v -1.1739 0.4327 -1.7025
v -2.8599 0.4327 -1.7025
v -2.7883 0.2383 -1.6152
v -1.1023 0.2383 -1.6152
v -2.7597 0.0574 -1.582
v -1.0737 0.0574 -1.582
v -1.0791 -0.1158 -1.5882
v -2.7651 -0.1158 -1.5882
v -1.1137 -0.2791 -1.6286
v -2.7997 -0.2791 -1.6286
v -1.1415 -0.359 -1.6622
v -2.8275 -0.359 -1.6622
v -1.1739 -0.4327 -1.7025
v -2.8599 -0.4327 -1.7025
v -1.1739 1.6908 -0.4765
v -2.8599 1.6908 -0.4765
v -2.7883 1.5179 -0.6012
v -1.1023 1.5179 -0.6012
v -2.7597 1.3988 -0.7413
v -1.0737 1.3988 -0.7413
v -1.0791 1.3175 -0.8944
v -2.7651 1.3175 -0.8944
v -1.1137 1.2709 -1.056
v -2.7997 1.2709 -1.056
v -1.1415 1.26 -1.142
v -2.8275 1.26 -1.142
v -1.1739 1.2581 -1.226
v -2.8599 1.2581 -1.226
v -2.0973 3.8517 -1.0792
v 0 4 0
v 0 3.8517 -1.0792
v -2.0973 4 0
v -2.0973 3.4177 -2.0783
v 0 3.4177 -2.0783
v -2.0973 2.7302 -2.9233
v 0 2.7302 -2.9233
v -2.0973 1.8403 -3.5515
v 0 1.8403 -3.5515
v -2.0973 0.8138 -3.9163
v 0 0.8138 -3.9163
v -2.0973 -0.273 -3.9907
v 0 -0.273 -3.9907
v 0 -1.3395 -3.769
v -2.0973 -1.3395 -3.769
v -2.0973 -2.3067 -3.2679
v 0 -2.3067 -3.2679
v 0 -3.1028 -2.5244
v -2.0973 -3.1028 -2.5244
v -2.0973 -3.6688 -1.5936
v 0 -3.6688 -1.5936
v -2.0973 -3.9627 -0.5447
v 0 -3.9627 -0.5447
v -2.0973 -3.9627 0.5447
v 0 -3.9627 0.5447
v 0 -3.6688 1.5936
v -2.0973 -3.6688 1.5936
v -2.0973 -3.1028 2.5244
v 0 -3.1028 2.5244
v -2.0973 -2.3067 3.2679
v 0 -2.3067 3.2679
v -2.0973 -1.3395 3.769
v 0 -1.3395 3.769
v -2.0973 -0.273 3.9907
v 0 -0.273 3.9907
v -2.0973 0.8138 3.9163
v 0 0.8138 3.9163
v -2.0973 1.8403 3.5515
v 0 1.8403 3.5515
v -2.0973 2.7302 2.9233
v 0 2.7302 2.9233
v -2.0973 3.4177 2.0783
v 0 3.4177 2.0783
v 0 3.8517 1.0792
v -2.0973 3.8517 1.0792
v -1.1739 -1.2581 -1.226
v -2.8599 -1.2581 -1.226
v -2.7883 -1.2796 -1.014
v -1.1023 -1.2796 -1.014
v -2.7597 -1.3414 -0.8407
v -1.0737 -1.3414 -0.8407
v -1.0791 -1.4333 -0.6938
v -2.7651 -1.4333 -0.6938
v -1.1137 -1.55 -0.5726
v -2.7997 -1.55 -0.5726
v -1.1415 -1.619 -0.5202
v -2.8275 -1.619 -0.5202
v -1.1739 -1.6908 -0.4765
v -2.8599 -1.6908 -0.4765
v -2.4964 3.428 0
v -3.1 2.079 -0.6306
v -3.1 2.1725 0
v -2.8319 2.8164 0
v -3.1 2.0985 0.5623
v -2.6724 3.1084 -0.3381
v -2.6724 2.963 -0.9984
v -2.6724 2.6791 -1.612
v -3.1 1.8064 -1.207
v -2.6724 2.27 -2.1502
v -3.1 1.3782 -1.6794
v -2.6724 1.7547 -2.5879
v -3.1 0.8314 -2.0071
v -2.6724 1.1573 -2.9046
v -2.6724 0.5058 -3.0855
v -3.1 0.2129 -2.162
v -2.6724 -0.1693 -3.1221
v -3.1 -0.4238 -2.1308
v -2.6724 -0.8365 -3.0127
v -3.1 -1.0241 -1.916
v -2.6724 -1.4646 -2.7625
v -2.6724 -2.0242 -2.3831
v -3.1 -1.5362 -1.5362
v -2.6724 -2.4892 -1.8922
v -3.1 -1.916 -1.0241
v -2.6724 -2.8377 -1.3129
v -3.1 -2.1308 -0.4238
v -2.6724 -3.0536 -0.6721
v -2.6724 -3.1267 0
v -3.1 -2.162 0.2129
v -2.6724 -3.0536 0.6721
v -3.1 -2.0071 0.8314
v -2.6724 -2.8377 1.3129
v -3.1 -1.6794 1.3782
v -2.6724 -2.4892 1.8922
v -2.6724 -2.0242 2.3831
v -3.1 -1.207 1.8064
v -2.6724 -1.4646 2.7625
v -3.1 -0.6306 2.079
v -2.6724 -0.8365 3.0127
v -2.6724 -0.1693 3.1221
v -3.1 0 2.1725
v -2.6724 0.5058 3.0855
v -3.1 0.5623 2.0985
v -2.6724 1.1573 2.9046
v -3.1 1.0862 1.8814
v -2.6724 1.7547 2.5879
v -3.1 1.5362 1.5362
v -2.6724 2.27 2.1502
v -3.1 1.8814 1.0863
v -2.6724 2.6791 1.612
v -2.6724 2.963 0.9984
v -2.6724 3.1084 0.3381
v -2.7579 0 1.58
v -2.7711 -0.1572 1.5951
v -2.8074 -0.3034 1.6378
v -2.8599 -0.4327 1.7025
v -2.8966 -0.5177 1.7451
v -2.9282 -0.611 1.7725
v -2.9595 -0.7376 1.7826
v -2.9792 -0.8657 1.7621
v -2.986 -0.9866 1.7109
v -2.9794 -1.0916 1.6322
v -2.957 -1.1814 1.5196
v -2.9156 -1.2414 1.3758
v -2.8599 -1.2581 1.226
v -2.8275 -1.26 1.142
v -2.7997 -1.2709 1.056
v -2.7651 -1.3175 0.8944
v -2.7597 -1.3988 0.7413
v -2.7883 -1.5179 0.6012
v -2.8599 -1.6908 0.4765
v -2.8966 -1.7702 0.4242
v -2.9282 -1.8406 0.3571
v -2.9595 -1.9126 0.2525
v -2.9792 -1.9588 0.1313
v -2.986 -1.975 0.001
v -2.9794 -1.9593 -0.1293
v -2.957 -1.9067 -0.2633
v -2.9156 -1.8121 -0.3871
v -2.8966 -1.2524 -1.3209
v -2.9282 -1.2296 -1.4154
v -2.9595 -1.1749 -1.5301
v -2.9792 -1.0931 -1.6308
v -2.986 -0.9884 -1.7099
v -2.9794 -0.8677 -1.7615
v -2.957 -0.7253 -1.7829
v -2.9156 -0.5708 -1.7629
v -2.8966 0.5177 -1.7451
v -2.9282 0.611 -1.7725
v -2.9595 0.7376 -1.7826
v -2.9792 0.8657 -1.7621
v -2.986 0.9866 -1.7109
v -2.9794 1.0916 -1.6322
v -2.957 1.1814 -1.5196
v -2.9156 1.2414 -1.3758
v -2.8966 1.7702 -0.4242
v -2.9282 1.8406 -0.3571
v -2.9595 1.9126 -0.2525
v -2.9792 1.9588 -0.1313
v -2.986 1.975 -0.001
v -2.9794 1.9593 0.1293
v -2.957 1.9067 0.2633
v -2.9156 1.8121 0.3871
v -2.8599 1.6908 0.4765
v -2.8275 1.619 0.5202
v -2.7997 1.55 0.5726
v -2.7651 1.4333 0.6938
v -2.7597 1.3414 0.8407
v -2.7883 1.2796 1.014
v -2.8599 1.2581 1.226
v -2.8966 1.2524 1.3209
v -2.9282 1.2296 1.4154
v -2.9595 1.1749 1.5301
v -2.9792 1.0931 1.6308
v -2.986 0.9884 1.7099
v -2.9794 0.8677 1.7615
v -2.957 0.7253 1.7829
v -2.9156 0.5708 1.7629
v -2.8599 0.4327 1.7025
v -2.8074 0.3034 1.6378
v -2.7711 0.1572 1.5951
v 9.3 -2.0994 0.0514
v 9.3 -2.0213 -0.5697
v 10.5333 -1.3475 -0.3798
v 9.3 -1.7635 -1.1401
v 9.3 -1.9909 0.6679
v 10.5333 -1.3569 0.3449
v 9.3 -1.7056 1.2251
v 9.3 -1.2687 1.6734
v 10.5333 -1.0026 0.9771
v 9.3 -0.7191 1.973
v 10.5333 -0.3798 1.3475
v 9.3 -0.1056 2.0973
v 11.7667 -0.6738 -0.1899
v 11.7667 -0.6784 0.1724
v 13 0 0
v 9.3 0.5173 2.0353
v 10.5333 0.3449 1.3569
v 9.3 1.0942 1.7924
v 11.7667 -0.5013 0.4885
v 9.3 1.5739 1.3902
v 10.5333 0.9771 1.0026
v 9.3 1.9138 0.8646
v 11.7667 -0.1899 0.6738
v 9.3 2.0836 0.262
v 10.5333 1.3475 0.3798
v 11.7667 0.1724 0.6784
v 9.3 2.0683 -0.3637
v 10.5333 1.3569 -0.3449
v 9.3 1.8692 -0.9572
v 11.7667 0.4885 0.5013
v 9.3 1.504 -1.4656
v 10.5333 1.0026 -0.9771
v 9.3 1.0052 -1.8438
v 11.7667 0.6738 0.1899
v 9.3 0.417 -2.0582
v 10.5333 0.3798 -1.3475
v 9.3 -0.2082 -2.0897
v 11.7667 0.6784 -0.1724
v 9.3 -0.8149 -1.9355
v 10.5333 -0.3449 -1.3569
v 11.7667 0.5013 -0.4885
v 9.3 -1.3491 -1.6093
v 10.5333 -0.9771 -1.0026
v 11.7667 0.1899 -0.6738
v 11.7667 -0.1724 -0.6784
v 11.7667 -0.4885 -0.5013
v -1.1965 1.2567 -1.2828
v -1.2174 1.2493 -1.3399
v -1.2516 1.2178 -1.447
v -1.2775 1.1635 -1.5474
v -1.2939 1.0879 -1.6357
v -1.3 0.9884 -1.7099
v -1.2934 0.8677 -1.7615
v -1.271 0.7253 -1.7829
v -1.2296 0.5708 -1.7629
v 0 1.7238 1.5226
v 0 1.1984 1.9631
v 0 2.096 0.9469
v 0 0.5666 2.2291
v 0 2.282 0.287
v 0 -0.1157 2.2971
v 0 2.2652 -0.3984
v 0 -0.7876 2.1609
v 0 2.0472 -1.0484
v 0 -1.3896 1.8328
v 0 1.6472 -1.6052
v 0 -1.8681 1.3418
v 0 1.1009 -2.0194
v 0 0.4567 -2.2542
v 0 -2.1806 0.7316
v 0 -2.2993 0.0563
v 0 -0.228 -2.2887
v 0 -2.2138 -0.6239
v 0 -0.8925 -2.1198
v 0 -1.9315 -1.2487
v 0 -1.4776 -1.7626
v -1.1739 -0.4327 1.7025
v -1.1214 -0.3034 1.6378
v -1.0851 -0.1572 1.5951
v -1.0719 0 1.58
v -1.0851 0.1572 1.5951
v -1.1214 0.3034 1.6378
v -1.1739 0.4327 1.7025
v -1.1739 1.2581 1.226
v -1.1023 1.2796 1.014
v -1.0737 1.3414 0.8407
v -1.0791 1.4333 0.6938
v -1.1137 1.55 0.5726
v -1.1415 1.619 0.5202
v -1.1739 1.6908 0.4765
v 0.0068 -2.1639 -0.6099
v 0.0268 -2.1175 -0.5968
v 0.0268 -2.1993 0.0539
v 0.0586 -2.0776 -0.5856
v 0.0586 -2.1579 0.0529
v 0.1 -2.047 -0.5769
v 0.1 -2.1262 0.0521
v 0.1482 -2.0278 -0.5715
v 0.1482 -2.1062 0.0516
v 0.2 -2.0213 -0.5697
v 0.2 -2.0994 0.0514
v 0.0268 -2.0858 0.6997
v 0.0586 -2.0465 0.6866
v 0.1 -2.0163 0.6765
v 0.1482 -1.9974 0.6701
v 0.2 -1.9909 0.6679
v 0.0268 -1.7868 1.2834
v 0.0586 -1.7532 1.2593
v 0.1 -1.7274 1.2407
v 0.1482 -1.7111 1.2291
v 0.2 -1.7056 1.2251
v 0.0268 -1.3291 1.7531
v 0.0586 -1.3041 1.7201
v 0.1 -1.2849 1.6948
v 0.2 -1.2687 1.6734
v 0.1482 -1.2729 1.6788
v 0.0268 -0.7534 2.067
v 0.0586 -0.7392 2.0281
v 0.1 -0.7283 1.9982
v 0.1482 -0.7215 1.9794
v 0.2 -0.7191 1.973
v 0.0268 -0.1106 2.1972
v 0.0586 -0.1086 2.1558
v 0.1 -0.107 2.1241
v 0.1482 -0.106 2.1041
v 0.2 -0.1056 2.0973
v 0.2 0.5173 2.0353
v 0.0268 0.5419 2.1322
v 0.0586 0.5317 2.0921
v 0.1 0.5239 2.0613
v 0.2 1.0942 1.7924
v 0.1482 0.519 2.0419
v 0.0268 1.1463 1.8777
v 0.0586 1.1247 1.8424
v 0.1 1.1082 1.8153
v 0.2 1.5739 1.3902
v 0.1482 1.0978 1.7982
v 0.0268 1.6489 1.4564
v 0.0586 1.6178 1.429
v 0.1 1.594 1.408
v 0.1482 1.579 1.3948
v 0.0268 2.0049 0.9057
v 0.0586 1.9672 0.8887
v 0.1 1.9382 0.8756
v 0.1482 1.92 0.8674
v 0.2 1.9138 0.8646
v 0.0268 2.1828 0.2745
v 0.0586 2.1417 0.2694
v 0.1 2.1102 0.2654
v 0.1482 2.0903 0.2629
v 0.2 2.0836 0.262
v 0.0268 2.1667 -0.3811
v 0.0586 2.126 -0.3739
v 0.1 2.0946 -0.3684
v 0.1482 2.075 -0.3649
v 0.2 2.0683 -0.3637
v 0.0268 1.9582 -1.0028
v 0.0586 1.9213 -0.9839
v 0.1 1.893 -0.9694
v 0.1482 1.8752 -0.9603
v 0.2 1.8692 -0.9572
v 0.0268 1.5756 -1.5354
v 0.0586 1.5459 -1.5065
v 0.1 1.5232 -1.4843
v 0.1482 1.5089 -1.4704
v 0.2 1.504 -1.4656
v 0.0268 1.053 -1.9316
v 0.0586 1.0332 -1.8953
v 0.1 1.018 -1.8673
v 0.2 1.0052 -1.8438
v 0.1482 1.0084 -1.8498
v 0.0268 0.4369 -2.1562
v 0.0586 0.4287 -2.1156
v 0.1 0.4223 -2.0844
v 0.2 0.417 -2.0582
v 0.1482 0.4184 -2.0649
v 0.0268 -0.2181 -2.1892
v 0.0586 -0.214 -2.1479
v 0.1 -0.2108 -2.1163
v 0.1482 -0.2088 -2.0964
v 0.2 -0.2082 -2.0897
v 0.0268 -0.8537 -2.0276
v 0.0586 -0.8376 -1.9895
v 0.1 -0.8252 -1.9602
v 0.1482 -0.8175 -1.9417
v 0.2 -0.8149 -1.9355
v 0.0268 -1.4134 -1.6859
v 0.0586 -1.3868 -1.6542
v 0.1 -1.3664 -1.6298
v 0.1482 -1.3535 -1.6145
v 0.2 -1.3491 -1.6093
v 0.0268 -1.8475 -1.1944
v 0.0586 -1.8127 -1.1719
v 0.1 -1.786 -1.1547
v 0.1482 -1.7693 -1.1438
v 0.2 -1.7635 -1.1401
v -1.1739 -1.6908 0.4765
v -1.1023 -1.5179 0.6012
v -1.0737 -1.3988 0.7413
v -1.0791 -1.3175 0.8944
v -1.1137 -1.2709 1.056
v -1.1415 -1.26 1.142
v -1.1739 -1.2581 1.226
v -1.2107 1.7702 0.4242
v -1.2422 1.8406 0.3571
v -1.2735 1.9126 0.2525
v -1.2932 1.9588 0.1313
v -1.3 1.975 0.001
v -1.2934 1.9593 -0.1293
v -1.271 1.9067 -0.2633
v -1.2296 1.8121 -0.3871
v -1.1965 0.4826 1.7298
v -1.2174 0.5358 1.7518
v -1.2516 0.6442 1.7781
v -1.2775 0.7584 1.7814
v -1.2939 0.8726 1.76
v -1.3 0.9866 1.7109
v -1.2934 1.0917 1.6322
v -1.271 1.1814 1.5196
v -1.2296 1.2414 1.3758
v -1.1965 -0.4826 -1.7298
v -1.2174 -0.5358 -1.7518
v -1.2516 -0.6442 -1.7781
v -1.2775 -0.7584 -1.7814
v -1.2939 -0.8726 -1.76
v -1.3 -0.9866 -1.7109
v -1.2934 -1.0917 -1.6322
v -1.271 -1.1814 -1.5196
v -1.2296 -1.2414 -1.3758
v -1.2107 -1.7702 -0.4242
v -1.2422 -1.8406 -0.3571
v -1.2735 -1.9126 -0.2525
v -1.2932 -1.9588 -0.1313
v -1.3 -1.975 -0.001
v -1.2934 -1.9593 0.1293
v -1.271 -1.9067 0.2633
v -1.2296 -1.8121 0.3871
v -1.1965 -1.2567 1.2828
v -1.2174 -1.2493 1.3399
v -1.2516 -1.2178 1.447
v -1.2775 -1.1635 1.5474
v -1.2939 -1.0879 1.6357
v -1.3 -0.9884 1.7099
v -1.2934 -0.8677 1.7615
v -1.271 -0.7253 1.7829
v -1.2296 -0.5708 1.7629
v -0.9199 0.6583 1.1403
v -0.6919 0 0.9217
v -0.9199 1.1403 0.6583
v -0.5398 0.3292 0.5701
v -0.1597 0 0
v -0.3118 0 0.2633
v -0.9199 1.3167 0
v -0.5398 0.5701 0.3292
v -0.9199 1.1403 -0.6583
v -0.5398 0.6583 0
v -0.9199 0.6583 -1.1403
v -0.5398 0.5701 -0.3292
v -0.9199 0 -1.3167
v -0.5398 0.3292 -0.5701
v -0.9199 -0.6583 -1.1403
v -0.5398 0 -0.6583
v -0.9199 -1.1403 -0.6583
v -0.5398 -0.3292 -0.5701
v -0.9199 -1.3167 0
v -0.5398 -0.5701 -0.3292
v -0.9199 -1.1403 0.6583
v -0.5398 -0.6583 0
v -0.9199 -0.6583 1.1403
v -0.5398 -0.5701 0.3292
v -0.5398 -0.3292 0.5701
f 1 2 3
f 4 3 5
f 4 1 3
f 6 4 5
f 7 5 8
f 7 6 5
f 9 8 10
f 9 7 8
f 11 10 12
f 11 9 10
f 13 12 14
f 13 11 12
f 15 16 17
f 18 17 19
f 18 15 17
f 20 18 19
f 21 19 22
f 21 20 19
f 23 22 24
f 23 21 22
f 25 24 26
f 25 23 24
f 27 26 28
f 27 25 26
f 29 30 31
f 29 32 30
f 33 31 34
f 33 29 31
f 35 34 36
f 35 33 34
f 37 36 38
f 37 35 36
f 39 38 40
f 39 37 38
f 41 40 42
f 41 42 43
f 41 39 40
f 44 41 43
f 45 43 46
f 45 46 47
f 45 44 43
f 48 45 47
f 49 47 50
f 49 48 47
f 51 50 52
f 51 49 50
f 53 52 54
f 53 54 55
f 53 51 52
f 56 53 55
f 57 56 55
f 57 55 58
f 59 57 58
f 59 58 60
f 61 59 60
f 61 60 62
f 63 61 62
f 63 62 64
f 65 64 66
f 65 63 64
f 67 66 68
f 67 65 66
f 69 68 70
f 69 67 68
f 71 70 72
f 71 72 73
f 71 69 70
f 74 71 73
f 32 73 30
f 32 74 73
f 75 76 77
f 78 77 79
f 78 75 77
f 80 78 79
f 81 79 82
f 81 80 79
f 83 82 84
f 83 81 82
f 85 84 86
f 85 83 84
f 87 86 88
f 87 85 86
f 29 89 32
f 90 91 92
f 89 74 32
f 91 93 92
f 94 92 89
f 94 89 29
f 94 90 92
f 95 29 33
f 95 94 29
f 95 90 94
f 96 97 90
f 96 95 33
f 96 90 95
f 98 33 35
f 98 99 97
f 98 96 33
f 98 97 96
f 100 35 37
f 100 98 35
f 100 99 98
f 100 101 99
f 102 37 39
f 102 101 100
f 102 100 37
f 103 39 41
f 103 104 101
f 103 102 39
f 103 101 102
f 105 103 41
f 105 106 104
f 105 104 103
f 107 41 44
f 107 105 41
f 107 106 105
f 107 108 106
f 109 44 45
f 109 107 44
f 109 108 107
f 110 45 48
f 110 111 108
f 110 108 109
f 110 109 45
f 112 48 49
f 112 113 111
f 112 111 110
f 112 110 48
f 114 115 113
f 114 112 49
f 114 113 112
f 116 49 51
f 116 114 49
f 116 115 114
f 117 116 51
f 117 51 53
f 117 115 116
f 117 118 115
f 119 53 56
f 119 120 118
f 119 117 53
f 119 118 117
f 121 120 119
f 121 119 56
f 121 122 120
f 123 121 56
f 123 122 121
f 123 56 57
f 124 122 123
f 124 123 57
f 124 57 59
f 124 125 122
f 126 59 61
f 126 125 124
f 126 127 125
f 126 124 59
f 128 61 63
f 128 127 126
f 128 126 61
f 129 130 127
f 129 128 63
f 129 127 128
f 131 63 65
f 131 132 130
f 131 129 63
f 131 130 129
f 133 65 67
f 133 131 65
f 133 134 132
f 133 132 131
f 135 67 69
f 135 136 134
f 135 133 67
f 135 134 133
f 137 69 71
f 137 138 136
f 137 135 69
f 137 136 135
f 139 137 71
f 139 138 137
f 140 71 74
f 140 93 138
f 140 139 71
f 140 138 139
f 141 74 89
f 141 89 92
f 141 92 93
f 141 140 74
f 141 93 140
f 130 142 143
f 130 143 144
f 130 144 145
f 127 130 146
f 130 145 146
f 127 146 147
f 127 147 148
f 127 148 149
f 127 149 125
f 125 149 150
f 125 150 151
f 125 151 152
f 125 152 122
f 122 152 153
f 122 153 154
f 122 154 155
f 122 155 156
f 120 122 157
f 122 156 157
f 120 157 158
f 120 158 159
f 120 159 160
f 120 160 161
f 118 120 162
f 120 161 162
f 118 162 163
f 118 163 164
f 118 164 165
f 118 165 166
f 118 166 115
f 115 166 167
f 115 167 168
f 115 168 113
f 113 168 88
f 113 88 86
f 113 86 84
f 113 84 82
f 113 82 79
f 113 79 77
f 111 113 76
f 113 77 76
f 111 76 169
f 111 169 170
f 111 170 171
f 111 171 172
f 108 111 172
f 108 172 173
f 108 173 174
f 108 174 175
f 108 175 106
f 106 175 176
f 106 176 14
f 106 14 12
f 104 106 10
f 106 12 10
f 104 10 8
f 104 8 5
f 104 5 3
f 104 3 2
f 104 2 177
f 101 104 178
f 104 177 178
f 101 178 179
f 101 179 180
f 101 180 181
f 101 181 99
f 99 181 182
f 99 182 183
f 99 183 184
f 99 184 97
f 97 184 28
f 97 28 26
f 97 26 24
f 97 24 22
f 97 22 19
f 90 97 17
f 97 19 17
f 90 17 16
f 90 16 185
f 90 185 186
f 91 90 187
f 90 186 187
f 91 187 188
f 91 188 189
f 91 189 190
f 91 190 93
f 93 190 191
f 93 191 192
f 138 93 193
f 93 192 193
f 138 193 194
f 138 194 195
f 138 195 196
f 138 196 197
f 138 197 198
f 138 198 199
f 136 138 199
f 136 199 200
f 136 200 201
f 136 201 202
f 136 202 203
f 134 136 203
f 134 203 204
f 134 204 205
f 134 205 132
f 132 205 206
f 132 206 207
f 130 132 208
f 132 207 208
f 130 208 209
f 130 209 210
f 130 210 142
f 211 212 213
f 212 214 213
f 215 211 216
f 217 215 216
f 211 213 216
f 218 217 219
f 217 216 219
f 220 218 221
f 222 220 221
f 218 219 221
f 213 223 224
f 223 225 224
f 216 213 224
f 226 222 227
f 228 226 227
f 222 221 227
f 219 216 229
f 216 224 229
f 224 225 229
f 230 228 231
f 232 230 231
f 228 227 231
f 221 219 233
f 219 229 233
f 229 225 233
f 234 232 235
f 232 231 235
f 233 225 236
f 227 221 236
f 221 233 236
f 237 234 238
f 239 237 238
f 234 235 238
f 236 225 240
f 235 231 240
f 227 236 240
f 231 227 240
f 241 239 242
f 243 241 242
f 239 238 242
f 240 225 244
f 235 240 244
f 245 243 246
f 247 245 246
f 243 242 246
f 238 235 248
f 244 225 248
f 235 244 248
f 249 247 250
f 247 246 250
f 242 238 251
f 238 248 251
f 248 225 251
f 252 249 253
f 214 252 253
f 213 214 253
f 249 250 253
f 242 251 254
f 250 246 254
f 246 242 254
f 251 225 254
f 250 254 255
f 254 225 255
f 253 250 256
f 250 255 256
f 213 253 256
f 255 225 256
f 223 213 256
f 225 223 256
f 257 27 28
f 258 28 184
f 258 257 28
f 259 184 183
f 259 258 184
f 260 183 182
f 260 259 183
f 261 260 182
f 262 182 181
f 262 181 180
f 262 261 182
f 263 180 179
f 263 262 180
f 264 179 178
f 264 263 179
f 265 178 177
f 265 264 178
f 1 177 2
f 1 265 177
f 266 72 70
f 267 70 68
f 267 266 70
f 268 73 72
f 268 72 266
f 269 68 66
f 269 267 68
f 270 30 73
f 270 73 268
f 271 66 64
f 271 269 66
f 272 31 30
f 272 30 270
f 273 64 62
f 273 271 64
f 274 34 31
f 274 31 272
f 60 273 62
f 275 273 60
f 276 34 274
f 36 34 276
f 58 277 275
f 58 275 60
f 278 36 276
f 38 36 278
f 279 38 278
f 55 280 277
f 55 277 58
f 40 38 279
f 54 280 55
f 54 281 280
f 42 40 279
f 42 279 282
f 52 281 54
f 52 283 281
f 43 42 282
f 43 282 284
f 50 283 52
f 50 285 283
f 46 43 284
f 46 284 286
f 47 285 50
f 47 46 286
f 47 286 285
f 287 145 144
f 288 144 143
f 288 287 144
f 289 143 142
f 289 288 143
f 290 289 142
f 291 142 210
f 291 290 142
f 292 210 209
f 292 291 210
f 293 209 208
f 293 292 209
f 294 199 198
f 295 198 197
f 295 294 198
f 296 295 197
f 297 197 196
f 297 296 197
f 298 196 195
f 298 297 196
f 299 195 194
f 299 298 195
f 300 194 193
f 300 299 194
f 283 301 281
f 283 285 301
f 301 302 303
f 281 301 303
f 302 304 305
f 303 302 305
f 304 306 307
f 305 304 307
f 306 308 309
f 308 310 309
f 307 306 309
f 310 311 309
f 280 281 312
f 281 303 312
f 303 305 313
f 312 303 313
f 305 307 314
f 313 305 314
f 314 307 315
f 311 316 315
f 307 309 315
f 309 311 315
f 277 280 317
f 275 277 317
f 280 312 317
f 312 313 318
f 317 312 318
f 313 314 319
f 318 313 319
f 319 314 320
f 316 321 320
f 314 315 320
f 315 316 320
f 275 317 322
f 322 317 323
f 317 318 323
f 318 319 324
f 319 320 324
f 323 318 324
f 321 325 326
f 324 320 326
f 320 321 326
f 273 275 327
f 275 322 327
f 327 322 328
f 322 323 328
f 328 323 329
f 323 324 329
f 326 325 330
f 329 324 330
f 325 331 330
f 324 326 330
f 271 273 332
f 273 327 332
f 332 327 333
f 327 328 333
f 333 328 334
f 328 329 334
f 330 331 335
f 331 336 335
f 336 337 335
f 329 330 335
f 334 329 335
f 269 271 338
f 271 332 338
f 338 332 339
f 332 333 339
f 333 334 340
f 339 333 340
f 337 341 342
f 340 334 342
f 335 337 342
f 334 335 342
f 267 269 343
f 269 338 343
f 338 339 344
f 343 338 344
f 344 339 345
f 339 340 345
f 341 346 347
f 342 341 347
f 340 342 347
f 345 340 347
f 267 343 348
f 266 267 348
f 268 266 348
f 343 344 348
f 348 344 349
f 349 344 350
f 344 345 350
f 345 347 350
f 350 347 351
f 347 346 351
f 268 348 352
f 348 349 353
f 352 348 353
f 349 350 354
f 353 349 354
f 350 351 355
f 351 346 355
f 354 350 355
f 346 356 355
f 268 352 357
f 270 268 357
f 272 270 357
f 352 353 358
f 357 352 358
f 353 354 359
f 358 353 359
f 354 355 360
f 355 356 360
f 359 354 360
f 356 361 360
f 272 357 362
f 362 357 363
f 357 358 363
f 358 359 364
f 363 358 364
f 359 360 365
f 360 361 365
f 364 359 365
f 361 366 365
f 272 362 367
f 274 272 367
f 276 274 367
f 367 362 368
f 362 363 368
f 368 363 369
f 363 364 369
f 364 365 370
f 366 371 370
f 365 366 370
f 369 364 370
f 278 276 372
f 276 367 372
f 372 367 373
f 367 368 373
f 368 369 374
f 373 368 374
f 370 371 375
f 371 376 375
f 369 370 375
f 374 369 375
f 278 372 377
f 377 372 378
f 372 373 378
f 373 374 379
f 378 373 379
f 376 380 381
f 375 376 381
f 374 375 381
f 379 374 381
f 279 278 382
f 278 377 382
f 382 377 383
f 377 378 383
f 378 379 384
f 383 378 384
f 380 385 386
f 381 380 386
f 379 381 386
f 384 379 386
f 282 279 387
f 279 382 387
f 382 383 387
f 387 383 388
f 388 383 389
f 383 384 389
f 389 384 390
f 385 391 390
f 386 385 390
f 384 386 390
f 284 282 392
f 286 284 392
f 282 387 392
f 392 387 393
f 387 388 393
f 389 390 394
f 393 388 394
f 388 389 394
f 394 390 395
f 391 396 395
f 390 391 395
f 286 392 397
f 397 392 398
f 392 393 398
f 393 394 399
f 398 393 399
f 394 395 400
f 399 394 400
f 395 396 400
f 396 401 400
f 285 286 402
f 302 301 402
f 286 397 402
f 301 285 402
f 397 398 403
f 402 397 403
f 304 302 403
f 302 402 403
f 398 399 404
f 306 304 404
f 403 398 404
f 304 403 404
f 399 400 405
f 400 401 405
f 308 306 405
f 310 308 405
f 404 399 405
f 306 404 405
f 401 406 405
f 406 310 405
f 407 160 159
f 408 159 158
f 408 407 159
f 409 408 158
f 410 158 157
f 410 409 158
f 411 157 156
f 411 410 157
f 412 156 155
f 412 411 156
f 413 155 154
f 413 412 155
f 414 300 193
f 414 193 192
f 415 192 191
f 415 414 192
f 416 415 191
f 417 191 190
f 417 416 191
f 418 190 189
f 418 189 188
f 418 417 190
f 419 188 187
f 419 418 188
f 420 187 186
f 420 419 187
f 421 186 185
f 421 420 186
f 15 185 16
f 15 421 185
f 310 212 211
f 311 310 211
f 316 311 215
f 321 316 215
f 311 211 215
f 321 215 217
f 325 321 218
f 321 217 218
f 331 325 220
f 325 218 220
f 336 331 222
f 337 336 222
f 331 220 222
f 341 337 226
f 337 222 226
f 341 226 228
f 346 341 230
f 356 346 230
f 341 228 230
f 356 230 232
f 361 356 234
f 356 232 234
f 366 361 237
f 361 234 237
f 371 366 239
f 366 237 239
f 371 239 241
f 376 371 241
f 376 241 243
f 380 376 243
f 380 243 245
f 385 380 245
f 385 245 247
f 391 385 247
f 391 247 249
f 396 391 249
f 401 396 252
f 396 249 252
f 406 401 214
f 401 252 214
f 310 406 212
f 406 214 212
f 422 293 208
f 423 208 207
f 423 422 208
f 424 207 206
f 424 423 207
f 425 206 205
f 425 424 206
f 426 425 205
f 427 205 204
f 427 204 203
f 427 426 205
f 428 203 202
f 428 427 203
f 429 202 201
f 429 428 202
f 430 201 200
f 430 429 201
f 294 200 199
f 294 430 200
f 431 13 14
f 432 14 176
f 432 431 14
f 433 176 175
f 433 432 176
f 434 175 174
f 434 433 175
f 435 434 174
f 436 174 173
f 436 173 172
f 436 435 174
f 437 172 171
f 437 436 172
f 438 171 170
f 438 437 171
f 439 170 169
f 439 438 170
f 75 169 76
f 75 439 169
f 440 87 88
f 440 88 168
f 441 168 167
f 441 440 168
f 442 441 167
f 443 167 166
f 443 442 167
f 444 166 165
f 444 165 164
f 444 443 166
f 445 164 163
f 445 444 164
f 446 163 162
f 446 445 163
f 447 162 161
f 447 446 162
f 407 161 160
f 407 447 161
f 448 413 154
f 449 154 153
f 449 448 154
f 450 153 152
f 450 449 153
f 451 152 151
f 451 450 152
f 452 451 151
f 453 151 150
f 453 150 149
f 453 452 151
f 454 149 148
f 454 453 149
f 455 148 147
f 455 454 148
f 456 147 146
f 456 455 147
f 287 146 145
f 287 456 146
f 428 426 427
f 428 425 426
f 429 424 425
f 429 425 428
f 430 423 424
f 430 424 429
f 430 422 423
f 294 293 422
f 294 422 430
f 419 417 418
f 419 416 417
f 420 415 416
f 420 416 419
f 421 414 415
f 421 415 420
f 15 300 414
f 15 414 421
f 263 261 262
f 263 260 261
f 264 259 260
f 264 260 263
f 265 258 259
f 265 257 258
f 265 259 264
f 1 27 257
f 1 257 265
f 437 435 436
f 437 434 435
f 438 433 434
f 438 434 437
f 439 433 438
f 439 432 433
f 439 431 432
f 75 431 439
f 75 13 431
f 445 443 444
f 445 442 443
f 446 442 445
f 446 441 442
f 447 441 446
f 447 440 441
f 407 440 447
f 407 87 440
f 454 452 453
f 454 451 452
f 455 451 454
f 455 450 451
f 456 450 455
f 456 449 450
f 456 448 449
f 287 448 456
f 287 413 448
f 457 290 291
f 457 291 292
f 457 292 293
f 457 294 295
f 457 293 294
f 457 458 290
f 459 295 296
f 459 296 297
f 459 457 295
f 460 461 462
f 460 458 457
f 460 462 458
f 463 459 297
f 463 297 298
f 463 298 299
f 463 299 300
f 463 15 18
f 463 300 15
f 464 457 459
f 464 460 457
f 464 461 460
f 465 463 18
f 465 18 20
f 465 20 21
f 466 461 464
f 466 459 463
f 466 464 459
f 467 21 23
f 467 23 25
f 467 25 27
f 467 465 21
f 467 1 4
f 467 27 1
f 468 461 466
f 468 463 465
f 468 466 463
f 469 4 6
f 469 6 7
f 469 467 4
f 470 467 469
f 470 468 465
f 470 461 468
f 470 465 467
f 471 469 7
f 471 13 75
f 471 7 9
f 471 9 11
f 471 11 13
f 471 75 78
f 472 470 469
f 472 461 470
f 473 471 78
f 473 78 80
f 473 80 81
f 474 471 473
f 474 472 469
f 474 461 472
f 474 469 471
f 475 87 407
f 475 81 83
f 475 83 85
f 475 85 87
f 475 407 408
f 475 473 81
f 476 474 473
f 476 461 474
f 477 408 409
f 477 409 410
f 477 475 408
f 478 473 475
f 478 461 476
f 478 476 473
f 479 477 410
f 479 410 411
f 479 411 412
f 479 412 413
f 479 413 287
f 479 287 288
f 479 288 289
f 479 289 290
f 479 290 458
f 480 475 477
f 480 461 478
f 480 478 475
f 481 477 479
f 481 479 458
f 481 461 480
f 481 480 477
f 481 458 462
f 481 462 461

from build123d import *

# Parameters (mm, degrees)
CUT_EXTRUDE_1_REACH = 8.451
FILLET_1_R          = 0.2


with BuildPart() as part:
    # 草图2 → 旋转1 (revolve)
    with BuildSketch(Plane.XY):
        with BuildLine():
            Line((0, 0), (0, 4))
            Line((0, 4), (-2.097282132, 4))
            ThreePointArc((-2.097282132, 4), (-2.672376759, 3.126707508), (-3.1, 2.1725))
            Line((-3.1, 2.1725), (-3.1, 0))
            Line((-3.1, 0), (0, 0))
        make_face()
    revolve(axis=Axis((0, 0, 0), (-1, 0, 0)))

    # 草图3 → 切除-拉伸1 (cut, up to next)
    with BuildSketch(Plane(origin=(0, 0, 0), x_dir=(0, 0, -1), z_dir=(1, 0, 0)), mode=Mode.PRIVATE) as cut_extrude_1_sk1:
        with BuildLine():
            ThreePointArc((-0.476528859, 1.6908006), (0, 1.975), (0.476528859, 1.6908006))
            ThreePointArc((0.476528859, 1.6908006), (0.79, 1.368320138), (1.226011842, 1.258086397))
            ThreePointArc((1.226011842, 1.258086397), (1.710400172, 0.9875), (1.702540702, 0.432714202))
            ThreePointArc((1.702540702, 0.432714202), (1.58, 0), (1.702540702, -0.432714202))
            ThreePointArc((1.702540702, -0.432714202), (1.710400172, -0.9875), (1.226011842, -1.258086397))
            ThreePointArc((1.226011842, -1.258086397), (0.79, -1.368320138), (0.476528859, -1.6908006))
            ThreePointArc((0.476528859, -1.6908006), (0, -1.975), (-0.476528859, -1.6908006))
            ThreePointArc((-0.476528859, -1.6908006), (-0.79, -1.368320138), (-1.226011842, -1.258086397))
            ThreePointArc((-1.226011842, -1.258086397), (-1.710400172, -0.9875), (-1.702540702, -0.432714202))
            ThreePointArc((-1.702540702, -0.432714202), (-1.58, 0), (-1.702540702, 0.432714202))
            ThreePointArc((-1.702540702, 0.432714202), (-1.710400172, 0.9875), (-1.226011842, 1.258086397))
            ThreePointArc((-1.226011842, 1.258086397), (-0.79, 1.368320138), (-0.476528859, 1.6908006))
        make_face()
    cut_extrude_1_tool1 = extrude(cut_extrude_1_sk1.sketch, amount=-CUT_EXTRUDE_1_REACH, mode=Mode.PRIVATE) & part.part
    add(cut_extrude_1_tool1.solids().sort_by_distance((0, 0, 0))[0], mode=Mode.SUBTRACT)

    # 草图4 → 旋转2 (revolve)
    with BuildSketch(Plane.XY, mode=Mode.PRIVATE) as revolve_2_sk:
        Polygon((0, 1.975), (-1.3, 1.975), (-0.159733218, 0), (0, 0), align=None)
    revolve(revolve_2_sk.sketch.rotate(Axis((0, 0, 0), (-1, 0, 0)), 270), axis=Axis((0, 0, 0), (-1, 0, 0)))

    # 切除-拉伸2 cone 1 section (through the dimple's axis) → 切除-拉伸2 (revolve, cut)
    with BuildSketch(Plane(origin=(-3.1, 0, 0), x_dir=(0, 0, 1), z_dir=(0, 1, 0))):
        Polygon((0, 0), (2.1725, 0), (0, 1.25429346), align=None)
    revolve(axis=Axis((-3.1, 0, 0), (1, 0, 0)), mode=Mode.SUBTRACT)

    # 草图6 → 旋转3 (revolve)
    with BuildSketch(Plane.XY, mode=Mode.PRIVATE) as revolve_3_sk:
        Polygon((0, 2.1), (9.3, 2.1), (13, 0), (0, 0), align=None)
    revolve(revolve_3_sk.sketch.rotate(Axis((0, 0, 0), (-1, 0, 0)), 164.260244237), axis=Axis((0, 0, 0), (-1, 0, 0)))

    # 圆角1
    fillet_1_edges = [part.edges().sort_by_distance(p)[0] for p in [
        (0, 2.021257882, 0.569663562),
    ]]
    fillet(fillet_1_edges, radius=FILLET_1_R)


solid = part.part
